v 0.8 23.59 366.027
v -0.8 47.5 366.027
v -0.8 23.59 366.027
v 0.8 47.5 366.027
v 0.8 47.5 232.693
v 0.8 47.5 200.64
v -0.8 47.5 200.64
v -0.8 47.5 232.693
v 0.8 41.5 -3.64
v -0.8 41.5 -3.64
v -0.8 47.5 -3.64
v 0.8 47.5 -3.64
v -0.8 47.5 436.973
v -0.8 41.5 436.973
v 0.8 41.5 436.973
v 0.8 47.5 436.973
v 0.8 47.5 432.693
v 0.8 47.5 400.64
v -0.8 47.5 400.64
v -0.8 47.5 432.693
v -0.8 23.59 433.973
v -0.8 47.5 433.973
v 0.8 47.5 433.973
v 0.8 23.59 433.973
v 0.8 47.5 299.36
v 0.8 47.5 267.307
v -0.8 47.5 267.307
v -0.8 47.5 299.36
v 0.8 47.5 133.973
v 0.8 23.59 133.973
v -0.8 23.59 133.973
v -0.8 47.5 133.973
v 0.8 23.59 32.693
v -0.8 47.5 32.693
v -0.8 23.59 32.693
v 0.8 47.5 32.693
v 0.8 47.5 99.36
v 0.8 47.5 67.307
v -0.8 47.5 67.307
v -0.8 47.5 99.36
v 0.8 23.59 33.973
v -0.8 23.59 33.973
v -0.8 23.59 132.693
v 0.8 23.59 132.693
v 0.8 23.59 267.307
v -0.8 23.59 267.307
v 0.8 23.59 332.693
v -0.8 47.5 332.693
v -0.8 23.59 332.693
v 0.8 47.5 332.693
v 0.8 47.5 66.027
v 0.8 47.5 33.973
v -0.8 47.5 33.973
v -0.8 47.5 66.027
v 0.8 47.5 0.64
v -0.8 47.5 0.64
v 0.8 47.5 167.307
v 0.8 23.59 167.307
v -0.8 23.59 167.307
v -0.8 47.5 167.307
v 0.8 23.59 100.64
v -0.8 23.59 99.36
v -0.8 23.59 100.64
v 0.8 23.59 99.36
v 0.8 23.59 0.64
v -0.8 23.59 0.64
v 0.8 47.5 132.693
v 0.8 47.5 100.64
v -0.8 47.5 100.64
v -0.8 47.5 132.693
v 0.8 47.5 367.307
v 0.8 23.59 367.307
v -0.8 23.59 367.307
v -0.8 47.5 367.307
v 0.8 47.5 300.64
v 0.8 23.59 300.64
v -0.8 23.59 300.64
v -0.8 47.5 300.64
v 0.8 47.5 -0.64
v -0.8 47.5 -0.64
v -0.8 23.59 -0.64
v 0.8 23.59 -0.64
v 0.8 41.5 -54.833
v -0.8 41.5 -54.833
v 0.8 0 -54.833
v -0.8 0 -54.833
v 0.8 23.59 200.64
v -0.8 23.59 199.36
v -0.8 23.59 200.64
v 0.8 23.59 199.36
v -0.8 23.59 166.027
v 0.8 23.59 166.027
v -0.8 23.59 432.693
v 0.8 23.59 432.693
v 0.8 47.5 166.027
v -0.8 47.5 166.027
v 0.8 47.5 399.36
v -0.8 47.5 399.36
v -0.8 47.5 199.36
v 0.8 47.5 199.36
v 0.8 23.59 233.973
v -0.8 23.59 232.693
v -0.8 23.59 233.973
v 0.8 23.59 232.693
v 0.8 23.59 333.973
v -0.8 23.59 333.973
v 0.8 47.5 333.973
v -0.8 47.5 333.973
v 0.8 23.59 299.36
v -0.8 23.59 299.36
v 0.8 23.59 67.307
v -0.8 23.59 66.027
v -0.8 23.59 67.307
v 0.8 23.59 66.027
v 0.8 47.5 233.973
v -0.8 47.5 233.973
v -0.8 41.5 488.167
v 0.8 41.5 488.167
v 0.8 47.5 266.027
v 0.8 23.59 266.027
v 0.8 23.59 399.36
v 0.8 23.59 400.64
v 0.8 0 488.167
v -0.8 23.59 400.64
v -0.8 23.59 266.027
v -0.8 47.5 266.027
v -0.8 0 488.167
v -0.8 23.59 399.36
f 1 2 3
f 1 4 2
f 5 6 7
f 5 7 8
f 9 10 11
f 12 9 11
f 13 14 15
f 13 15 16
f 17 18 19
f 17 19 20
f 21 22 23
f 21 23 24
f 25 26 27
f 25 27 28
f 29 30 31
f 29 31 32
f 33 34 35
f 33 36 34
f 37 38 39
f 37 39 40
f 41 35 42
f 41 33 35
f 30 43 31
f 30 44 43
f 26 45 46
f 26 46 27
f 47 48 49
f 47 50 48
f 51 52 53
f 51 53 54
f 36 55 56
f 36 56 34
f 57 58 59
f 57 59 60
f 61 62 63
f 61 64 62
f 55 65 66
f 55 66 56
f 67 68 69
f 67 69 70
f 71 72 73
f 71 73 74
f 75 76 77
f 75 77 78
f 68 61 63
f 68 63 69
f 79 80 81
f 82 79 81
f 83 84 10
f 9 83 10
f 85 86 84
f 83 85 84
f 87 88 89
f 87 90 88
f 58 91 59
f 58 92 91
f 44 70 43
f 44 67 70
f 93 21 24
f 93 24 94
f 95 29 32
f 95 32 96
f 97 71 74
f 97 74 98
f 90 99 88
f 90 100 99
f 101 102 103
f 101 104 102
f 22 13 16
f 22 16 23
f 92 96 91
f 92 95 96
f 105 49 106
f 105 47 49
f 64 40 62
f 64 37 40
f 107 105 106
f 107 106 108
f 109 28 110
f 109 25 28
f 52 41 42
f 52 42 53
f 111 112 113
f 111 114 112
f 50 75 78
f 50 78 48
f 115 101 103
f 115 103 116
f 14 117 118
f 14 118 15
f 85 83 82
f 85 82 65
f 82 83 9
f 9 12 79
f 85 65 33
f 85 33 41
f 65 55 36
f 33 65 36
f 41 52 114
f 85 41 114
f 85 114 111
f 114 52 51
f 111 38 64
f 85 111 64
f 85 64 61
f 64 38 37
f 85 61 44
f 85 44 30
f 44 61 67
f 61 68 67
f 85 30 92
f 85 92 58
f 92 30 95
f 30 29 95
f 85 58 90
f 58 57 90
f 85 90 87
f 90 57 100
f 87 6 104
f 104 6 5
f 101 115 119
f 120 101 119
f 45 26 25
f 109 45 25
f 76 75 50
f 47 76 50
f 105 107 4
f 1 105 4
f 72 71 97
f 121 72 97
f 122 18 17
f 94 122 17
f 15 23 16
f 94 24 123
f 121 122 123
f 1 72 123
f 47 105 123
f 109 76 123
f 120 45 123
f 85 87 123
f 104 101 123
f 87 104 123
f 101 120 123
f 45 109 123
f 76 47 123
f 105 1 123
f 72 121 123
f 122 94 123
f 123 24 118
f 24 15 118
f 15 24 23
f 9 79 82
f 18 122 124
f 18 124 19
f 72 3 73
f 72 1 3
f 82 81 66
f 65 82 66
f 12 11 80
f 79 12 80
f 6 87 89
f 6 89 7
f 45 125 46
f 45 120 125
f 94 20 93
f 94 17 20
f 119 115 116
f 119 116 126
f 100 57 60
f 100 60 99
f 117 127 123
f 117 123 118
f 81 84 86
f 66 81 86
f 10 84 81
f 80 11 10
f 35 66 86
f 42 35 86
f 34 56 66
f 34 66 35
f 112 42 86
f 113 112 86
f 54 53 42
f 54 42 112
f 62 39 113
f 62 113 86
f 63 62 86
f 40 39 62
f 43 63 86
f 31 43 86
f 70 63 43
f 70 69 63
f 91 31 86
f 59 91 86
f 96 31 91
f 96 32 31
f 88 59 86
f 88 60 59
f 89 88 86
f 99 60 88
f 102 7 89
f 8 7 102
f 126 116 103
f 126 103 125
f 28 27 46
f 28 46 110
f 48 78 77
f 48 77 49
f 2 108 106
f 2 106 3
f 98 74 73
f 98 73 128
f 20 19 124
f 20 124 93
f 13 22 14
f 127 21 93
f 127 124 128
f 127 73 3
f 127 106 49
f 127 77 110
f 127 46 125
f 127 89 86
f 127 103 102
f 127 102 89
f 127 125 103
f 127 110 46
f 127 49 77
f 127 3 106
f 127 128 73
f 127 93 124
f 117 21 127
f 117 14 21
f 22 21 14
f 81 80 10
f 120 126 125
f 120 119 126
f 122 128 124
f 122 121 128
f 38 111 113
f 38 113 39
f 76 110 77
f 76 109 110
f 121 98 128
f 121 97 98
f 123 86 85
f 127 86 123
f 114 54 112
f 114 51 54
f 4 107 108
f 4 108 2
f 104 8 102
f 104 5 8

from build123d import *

# Parameters (mm, degrees)
MIDDLE_DEPTH     = 0.8
LPATTERN3_COUNT  = 13
LPATTERN3_PITCH  = 33.333333
FIRST_DEPTH      = 0.8
FIRST_DEPTH_BACK = 0.8
LAST_DEPTH       = 0.8
LAST_DEPTH_BACK  = 0.8


with BuildPart() as part:
    # MiddlePart → Middle (new, symmetric)
    with BuildSketch(Plane(origin=(0, 0, 0), x_dir=(0, 0, -1), z_dir=(1, 0, 0))):
        Polygon((-33.333333, 23.59), (-33.333333, 0), (0, 0), (0, 23.59), (-0.64, 23.59), (-0.64, 47.5), (-32.693333, 47.5), (-32.693333, 23.59), align=None)
    extrude(amount=MIDDLE_DEPTH, both=True)

    # LPattern3: part ×13


with BuildPart() as part_1:
    add(part.part)
    with Locations(*[(0, 0, i * LPATTERN3_PITCH) for i in range(1, LPATTERN3_COUNT)]):
        add(part.part)

    # FirstPart → First (add, two sides: drawn at the far end of the back side and taken through both)
    with BuildSketch(Plane(origin=(0, 0, 0), x_dir=(0, 0, -1), z_dir=(1, 0, 0)).offset(-FIRST_DEPTH_BACK)):
        Polygon((0, 23.59), (0, 0), (54.8333355, 0), (54.8333355, 41.5), (3.64, 41.5), (3.64, 47.5), (0.64, 47.5), (0.64, 23.59), align=None)
    extrude(amount=FIRST_DEPTH + FIRST_DEPTH_BACK)

    # LastPart → Last (add, two sides: drawn at the far end of the back side and taken through both)
    with BuildSketch(Plane(origin=(0, 0, 0), x_dir=(0, 0, -1), z_dir=(1, 0, 0)).offset(-LAST_DEPTH_BACK)):
        Polygon((-436.973329, 47.5), (-433.973329, 47.5), (-433.973329, 23.59), (-433.333329, 23.59), (-433.333329, 0), (-488.1666645, 0), (-488.1666645, 41.5), (-436.973329, 41.5), align=None)
    extrude(amount=LAST_DEPTH + LAST_DEPTH_BACK)


solid = part_1.part
